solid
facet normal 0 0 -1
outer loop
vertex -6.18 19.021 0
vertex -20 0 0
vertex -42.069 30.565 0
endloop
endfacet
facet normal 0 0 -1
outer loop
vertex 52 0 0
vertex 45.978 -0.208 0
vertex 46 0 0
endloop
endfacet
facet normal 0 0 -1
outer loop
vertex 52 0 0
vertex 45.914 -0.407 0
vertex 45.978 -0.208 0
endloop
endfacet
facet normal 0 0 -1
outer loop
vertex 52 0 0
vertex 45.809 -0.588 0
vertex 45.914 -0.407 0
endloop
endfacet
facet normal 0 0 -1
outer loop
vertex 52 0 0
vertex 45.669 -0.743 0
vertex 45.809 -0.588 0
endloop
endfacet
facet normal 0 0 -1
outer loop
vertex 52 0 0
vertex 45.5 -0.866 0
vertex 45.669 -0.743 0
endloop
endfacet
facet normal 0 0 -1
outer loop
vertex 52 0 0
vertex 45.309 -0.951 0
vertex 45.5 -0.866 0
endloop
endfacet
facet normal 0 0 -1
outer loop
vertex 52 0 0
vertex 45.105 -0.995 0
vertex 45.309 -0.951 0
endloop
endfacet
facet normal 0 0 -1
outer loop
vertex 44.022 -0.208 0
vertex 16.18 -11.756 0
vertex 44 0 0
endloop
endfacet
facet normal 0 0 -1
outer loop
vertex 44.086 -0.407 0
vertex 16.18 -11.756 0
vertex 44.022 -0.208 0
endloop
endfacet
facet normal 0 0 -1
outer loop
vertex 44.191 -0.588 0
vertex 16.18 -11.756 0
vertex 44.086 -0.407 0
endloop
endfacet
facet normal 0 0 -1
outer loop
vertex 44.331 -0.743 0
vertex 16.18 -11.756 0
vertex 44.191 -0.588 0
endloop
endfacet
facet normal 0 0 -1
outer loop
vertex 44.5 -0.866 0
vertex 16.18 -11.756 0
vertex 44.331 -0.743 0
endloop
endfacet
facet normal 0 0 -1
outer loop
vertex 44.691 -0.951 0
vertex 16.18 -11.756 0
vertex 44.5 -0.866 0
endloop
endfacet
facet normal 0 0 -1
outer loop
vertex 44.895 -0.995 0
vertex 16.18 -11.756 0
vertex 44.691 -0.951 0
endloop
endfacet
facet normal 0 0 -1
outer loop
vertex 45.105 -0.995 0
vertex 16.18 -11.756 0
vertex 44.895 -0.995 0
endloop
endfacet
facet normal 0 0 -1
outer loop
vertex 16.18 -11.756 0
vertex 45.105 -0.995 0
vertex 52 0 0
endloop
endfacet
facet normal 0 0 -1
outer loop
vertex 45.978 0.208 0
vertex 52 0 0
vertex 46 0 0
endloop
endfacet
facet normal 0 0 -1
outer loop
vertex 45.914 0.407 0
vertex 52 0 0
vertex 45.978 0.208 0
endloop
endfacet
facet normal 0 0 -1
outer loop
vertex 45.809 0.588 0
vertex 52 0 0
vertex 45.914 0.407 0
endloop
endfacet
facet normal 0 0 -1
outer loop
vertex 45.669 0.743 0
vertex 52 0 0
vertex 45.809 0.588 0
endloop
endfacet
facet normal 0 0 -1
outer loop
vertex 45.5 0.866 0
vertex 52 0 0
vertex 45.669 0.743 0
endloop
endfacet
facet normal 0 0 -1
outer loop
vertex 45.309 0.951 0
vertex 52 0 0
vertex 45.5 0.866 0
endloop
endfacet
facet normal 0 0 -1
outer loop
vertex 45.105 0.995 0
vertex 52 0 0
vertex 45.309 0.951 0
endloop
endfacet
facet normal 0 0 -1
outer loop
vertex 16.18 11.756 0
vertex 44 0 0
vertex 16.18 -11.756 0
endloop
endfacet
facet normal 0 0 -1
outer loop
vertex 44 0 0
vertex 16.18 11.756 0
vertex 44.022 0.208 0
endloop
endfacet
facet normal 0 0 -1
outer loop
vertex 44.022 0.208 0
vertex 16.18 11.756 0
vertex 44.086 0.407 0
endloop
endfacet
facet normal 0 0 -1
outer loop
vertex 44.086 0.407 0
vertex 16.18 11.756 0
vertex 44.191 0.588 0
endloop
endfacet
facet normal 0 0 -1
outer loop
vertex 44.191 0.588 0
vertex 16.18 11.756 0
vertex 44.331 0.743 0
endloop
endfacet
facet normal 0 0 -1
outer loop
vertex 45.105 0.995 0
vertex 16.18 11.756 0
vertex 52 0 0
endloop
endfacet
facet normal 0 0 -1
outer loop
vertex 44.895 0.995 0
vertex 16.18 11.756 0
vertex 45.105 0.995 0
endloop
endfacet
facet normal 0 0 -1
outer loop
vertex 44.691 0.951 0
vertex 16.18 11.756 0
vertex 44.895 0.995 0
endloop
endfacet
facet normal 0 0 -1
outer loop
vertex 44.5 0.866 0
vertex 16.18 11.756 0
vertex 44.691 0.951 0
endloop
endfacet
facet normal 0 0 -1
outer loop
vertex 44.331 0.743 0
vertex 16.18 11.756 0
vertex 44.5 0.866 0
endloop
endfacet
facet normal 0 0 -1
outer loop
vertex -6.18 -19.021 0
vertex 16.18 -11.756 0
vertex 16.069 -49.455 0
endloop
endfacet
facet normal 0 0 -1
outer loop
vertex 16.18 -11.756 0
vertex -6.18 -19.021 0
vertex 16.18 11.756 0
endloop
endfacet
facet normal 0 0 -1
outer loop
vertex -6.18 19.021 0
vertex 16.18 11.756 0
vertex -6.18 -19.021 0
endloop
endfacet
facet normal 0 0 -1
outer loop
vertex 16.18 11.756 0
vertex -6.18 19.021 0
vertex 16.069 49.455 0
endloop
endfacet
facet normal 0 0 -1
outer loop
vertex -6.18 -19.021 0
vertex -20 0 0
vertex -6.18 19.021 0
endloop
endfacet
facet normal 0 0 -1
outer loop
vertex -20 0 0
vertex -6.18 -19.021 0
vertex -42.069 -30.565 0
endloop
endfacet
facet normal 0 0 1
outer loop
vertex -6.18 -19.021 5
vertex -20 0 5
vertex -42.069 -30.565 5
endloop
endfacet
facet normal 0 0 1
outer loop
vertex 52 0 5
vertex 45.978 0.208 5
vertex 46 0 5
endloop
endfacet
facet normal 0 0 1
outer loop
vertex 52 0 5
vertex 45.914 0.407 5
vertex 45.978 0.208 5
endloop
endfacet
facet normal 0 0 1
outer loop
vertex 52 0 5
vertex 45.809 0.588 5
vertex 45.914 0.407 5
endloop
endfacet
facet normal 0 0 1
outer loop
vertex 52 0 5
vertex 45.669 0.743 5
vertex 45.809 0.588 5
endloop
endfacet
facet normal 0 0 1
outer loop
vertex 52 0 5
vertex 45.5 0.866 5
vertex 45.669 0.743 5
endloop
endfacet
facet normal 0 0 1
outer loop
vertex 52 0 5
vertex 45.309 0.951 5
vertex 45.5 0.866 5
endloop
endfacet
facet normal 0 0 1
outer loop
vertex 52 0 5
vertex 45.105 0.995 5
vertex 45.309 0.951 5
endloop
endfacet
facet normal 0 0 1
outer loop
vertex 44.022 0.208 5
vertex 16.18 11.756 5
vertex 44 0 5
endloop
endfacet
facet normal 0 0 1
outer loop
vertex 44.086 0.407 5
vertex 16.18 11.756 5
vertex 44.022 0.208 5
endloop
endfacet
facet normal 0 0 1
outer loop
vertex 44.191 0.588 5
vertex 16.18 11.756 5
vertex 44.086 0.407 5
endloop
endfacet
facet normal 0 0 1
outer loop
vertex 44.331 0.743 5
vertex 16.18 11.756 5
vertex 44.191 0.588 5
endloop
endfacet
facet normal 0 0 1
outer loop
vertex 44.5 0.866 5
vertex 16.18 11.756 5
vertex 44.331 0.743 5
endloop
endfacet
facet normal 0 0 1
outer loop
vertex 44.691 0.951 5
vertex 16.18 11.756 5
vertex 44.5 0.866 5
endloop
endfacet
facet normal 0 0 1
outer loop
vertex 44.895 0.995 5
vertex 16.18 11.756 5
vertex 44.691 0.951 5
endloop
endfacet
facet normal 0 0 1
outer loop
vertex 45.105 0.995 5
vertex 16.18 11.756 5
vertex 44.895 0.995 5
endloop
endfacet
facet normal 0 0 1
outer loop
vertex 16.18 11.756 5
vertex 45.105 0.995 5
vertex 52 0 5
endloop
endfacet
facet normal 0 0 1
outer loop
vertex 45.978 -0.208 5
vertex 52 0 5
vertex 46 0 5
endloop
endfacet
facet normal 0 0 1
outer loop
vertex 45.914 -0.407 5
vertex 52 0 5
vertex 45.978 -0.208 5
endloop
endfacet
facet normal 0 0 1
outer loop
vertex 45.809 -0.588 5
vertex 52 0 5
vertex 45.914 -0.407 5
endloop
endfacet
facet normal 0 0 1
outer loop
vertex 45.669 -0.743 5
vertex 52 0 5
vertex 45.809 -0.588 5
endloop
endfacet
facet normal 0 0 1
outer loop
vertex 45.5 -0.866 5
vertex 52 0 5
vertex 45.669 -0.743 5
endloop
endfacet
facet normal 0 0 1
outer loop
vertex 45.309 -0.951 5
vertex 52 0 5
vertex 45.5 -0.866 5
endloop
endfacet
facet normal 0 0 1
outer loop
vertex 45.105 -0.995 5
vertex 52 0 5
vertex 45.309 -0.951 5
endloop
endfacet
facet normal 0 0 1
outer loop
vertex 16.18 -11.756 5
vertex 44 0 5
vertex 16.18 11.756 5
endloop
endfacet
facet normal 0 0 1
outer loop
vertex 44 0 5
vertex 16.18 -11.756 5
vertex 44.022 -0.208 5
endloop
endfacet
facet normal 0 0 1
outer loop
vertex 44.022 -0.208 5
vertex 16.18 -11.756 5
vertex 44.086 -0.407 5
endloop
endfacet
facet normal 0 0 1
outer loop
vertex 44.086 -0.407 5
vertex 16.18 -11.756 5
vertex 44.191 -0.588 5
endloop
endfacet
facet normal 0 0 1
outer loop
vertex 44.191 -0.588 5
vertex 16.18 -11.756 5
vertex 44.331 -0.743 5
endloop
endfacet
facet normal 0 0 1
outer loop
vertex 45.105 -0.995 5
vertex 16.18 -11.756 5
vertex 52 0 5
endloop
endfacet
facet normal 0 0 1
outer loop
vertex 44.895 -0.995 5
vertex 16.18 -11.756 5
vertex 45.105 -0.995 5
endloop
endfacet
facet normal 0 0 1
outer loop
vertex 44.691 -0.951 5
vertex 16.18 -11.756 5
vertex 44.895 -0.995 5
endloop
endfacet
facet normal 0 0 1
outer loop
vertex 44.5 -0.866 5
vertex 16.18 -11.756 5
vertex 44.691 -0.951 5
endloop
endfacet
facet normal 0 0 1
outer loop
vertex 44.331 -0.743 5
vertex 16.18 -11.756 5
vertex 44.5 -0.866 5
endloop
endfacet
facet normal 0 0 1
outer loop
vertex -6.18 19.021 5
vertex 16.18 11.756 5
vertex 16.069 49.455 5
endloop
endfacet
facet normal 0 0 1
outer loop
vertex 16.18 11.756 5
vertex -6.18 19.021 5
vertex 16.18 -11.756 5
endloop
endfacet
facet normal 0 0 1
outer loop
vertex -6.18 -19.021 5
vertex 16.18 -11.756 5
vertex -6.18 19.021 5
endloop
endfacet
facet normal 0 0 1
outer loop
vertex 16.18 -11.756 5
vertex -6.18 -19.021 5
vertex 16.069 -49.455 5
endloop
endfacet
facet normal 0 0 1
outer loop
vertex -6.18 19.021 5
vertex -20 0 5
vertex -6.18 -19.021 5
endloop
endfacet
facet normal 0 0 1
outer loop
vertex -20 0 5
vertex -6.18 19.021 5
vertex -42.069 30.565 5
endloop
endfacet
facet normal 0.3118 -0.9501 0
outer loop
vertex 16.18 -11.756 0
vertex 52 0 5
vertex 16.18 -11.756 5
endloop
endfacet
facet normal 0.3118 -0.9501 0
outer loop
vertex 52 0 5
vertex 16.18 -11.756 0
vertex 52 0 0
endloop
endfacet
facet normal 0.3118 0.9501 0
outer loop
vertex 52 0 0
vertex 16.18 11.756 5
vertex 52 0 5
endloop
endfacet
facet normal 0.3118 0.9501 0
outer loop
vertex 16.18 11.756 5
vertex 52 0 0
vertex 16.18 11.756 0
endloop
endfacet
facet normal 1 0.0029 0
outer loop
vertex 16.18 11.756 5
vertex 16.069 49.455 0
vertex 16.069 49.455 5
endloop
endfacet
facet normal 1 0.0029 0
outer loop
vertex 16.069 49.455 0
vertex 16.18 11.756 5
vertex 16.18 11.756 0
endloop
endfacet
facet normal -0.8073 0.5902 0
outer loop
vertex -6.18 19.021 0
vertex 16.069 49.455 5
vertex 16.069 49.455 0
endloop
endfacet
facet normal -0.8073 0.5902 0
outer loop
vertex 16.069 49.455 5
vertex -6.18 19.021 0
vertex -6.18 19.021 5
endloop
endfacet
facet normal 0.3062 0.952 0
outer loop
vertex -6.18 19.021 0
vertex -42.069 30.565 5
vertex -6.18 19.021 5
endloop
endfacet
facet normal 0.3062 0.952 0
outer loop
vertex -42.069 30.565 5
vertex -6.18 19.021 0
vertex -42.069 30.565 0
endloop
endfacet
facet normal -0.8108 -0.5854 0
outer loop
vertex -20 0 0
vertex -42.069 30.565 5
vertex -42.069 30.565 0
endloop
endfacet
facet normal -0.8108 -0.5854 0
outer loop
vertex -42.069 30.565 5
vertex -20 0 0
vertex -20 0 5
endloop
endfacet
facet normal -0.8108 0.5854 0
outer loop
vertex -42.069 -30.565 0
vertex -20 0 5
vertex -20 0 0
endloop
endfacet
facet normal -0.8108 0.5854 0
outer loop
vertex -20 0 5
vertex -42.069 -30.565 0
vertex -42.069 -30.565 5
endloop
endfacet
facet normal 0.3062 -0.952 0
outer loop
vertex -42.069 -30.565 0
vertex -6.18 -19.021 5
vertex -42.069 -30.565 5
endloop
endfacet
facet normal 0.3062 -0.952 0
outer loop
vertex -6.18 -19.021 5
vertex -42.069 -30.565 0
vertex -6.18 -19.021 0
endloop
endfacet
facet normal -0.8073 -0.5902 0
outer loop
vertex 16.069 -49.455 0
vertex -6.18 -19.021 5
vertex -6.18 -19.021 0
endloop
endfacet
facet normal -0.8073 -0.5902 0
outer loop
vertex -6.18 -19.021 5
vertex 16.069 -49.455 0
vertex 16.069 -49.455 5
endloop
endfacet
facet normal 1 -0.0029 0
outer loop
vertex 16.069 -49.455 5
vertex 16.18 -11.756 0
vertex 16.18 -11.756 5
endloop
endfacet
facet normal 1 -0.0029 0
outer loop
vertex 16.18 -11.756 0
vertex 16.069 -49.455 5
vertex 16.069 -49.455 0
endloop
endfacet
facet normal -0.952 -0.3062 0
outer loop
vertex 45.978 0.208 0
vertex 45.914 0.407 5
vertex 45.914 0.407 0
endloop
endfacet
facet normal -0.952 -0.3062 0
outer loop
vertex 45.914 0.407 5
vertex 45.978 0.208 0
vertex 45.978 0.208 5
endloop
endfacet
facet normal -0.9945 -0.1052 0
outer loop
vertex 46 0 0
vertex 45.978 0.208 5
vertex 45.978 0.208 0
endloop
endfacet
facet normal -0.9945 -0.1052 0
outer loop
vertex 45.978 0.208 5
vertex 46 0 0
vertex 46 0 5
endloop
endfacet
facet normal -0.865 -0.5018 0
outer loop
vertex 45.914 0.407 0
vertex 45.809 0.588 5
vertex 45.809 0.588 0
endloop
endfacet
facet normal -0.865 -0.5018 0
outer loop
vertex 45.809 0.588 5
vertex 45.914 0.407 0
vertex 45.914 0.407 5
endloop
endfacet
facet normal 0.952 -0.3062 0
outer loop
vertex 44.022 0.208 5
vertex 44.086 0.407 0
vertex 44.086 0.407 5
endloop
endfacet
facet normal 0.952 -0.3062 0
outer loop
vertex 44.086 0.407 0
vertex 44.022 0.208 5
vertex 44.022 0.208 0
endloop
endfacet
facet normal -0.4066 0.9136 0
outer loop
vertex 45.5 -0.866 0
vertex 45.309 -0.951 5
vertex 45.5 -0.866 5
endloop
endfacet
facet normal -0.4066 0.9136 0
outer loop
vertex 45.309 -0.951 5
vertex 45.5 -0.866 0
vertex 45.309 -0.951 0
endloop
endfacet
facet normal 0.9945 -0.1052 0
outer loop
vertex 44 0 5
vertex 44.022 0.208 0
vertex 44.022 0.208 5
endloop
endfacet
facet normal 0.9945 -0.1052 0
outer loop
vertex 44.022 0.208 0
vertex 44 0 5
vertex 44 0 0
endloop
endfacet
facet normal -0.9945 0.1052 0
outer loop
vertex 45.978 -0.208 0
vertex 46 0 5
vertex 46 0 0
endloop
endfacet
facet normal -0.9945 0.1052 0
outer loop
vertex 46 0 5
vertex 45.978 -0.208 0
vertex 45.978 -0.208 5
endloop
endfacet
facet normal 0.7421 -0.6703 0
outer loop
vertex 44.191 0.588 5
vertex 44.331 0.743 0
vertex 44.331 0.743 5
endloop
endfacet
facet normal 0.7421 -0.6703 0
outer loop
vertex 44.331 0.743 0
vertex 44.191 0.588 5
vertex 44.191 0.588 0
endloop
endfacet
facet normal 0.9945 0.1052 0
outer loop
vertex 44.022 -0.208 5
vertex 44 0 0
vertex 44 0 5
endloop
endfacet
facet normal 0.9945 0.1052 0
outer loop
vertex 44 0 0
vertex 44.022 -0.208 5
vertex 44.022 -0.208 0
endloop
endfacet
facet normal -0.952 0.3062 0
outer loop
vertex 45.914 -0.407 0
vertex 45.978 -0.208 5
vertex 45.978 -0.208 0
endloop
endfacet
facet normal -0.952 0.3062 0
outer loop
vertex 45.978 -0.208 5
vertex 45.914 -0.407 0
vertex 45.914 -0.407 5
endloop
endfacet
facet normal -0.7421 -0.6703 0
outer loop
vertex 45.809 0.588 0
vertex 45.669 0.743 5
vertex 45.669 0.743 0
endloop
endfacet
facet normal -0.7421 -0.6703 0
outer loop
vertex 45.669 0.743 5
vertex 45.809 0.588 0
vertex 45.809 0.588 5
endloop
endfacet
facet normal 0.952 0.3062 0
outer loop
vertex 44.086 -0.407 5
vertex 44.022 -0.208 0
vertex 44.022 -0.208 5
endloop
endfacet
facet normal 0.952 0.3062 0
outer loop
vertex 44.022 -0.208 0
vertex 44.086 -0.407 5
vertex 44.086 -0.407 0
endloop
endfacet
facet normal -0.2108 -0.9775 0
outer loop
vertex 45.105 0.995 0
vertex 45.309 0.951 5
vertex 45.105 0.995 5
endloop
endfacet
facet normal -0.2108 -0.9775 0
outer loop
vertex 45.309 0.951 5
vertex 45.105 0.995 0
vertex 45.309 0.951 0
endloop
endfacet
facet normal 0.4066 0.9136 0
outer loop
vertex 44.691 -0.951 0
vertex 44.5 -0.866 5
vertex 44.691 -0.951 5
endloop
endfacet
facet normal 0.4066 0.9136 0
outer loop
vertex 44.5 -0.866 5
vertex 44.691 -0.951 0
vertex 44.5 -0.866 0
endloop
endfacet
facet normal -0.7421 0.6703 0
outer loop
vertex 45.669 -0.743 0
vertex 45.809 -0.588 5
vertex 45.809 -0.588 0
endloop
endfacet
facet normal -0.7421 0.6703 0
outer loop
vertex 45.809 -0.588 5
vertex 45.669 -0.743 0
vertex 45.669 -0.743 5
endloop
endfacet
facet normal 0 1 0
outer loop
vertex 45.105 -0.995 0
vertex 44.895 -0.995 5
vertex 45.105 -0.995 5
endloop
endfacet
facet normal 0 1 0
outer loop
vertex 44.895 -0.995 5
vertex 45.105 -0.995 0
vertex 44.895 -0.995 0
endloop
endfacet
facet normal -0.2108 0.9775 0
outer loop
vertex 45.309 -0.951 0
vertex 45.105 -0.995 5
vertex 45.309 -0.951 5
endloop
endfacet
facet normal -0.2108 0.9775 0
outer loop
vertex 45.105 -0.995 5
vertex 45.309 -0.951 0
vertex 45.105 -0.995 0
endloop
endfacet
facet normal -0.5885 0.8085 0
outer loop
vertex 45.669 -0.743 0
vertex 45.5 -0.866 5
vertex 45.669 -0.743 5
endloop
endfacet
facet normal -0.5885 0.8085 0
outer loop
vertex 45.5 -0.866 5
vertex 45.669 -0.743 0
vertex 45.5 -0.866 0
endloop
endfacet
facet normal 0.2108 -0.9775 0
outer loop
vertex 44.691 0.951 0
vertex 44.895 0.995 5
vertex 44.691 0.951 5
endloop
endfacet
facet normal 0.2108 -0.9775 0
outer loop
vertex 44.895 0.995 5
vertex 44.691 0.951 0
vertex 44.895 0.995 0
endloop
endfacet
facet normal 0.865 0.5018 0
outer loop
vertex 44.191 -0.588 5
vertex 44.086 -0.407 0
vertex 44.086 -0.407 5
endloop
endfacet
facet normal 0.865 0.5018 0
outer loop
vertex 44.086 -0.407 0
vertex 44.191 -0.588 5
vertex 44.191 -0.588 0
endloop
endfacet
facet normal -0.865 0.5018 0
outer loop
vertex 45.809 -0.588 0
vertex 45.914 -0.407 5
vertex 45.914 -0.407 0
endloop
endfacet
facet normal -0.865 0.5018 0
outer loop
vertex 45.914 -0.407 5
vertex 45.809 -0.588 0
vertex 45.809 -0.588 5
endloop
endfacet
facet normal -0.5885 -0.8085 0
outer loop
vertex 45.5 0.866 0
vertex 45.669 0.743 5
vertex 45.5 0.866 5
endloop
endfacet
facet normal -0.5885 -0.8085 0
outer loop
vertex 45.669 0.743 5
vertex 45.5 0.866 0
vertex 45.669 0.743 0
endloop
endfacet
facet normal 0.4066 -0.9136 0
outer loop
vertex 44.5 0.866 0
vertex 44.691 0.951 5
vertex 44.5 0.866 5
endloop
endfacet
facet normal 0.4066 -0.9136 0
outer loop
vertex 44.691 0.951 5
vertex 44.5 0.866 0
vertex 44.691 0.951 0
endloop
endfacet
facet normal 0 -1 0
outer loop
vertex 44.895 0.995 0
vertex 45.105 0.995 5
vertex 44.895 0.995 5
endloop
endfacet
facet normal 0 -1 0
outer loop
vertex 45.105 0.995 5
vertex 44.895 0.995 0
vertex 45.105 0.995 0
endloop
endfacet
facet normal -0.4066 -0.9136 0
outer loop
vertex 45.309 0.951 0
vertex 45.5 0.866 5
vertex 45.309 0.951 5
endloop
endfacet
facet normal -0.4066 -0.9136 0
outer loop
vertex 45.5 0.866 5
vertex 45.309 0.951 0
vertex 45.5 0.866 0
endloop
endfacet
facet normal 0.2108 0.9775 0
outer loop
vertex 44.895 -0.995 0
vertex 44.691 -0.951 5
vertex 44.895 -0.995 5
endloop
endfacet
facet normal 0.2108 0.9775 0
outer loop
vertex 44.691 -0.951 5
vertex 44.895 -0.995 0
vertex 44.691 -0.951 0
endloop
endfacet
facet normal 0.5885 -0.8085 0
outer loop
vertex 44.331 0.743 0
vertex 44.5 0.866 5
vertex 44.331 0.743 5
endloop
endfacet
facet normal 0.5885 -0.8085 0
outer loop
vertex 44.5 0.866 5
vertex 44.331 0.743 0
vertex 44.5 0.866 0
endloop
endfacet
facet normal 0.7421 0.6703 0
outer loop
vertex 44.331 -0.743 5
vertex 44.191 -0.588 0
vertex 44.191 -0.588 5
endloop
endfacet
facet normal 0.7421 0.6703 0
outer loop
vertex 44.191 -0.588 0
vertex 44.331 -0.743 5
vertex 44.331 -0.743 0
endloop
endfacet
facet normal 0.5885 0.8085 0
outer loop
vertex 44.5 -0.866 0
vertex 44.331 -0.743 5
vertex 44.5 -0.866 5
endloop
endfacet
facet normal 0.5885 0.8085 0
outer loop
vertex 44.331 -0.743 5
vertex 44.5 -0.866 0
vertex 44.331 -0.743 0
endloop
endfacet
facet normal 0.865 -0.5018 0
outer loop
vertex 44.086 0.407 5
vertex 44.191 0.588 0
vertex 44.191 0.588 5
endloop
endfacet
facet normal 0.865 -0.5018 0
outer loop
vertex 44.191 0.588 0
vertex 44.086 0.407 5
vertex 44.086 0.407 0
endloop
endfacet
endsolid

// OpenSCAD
// updated for 2015.03 version to create one solid object, allowing for twists without stray parts.
// points          = number of points (minimum 3)
// outer           = radius to outer points
// inner           = radius to inner points
// depth           = how tall to make the 3D object
// rotation_offset = how many degrees from 0 to start the first point
// extrude_twist   = put a twist on things!
module Star(points, outer, inner, depth=10, rotation_offset=0, extrude_twist=0) {
	
	// polar to cartesian: radius/angle to x/y
	function x(r, a) = r * cos(a);
	function y(r, a) = r * sin(a);
	
	// angular width of each pie slice of the star
	increment = 360/points;
	
	// create a list / array of points to create the star, in sets of 2: the outer x,y point, followed by the innter x,y point
	points_array=[ for (p = [0:0.5:points-0.5]) let(a=x(outer,(increment*p)+rotation_offset), b=y(outer,(increment*p)+rotation_offset),c=x(inner,((increment*floor(p))+(increment/2))+rotation_offset), d=y(inner,((increment*floor(p))+(increment/2))+rotation_offset)) if(true) p==floor(p)?[a,b]:[c,d] ];
  
  	// make the object, in 3D, flat is boring!
        linear_extrude(height=depth, twist=extrude_twist) polygon(points=points_array);
  
}
$fn=30;
difference(){
    Star(5,52,20,5);
   translate([45,0,-1]) cylinder(22,1);   
}
